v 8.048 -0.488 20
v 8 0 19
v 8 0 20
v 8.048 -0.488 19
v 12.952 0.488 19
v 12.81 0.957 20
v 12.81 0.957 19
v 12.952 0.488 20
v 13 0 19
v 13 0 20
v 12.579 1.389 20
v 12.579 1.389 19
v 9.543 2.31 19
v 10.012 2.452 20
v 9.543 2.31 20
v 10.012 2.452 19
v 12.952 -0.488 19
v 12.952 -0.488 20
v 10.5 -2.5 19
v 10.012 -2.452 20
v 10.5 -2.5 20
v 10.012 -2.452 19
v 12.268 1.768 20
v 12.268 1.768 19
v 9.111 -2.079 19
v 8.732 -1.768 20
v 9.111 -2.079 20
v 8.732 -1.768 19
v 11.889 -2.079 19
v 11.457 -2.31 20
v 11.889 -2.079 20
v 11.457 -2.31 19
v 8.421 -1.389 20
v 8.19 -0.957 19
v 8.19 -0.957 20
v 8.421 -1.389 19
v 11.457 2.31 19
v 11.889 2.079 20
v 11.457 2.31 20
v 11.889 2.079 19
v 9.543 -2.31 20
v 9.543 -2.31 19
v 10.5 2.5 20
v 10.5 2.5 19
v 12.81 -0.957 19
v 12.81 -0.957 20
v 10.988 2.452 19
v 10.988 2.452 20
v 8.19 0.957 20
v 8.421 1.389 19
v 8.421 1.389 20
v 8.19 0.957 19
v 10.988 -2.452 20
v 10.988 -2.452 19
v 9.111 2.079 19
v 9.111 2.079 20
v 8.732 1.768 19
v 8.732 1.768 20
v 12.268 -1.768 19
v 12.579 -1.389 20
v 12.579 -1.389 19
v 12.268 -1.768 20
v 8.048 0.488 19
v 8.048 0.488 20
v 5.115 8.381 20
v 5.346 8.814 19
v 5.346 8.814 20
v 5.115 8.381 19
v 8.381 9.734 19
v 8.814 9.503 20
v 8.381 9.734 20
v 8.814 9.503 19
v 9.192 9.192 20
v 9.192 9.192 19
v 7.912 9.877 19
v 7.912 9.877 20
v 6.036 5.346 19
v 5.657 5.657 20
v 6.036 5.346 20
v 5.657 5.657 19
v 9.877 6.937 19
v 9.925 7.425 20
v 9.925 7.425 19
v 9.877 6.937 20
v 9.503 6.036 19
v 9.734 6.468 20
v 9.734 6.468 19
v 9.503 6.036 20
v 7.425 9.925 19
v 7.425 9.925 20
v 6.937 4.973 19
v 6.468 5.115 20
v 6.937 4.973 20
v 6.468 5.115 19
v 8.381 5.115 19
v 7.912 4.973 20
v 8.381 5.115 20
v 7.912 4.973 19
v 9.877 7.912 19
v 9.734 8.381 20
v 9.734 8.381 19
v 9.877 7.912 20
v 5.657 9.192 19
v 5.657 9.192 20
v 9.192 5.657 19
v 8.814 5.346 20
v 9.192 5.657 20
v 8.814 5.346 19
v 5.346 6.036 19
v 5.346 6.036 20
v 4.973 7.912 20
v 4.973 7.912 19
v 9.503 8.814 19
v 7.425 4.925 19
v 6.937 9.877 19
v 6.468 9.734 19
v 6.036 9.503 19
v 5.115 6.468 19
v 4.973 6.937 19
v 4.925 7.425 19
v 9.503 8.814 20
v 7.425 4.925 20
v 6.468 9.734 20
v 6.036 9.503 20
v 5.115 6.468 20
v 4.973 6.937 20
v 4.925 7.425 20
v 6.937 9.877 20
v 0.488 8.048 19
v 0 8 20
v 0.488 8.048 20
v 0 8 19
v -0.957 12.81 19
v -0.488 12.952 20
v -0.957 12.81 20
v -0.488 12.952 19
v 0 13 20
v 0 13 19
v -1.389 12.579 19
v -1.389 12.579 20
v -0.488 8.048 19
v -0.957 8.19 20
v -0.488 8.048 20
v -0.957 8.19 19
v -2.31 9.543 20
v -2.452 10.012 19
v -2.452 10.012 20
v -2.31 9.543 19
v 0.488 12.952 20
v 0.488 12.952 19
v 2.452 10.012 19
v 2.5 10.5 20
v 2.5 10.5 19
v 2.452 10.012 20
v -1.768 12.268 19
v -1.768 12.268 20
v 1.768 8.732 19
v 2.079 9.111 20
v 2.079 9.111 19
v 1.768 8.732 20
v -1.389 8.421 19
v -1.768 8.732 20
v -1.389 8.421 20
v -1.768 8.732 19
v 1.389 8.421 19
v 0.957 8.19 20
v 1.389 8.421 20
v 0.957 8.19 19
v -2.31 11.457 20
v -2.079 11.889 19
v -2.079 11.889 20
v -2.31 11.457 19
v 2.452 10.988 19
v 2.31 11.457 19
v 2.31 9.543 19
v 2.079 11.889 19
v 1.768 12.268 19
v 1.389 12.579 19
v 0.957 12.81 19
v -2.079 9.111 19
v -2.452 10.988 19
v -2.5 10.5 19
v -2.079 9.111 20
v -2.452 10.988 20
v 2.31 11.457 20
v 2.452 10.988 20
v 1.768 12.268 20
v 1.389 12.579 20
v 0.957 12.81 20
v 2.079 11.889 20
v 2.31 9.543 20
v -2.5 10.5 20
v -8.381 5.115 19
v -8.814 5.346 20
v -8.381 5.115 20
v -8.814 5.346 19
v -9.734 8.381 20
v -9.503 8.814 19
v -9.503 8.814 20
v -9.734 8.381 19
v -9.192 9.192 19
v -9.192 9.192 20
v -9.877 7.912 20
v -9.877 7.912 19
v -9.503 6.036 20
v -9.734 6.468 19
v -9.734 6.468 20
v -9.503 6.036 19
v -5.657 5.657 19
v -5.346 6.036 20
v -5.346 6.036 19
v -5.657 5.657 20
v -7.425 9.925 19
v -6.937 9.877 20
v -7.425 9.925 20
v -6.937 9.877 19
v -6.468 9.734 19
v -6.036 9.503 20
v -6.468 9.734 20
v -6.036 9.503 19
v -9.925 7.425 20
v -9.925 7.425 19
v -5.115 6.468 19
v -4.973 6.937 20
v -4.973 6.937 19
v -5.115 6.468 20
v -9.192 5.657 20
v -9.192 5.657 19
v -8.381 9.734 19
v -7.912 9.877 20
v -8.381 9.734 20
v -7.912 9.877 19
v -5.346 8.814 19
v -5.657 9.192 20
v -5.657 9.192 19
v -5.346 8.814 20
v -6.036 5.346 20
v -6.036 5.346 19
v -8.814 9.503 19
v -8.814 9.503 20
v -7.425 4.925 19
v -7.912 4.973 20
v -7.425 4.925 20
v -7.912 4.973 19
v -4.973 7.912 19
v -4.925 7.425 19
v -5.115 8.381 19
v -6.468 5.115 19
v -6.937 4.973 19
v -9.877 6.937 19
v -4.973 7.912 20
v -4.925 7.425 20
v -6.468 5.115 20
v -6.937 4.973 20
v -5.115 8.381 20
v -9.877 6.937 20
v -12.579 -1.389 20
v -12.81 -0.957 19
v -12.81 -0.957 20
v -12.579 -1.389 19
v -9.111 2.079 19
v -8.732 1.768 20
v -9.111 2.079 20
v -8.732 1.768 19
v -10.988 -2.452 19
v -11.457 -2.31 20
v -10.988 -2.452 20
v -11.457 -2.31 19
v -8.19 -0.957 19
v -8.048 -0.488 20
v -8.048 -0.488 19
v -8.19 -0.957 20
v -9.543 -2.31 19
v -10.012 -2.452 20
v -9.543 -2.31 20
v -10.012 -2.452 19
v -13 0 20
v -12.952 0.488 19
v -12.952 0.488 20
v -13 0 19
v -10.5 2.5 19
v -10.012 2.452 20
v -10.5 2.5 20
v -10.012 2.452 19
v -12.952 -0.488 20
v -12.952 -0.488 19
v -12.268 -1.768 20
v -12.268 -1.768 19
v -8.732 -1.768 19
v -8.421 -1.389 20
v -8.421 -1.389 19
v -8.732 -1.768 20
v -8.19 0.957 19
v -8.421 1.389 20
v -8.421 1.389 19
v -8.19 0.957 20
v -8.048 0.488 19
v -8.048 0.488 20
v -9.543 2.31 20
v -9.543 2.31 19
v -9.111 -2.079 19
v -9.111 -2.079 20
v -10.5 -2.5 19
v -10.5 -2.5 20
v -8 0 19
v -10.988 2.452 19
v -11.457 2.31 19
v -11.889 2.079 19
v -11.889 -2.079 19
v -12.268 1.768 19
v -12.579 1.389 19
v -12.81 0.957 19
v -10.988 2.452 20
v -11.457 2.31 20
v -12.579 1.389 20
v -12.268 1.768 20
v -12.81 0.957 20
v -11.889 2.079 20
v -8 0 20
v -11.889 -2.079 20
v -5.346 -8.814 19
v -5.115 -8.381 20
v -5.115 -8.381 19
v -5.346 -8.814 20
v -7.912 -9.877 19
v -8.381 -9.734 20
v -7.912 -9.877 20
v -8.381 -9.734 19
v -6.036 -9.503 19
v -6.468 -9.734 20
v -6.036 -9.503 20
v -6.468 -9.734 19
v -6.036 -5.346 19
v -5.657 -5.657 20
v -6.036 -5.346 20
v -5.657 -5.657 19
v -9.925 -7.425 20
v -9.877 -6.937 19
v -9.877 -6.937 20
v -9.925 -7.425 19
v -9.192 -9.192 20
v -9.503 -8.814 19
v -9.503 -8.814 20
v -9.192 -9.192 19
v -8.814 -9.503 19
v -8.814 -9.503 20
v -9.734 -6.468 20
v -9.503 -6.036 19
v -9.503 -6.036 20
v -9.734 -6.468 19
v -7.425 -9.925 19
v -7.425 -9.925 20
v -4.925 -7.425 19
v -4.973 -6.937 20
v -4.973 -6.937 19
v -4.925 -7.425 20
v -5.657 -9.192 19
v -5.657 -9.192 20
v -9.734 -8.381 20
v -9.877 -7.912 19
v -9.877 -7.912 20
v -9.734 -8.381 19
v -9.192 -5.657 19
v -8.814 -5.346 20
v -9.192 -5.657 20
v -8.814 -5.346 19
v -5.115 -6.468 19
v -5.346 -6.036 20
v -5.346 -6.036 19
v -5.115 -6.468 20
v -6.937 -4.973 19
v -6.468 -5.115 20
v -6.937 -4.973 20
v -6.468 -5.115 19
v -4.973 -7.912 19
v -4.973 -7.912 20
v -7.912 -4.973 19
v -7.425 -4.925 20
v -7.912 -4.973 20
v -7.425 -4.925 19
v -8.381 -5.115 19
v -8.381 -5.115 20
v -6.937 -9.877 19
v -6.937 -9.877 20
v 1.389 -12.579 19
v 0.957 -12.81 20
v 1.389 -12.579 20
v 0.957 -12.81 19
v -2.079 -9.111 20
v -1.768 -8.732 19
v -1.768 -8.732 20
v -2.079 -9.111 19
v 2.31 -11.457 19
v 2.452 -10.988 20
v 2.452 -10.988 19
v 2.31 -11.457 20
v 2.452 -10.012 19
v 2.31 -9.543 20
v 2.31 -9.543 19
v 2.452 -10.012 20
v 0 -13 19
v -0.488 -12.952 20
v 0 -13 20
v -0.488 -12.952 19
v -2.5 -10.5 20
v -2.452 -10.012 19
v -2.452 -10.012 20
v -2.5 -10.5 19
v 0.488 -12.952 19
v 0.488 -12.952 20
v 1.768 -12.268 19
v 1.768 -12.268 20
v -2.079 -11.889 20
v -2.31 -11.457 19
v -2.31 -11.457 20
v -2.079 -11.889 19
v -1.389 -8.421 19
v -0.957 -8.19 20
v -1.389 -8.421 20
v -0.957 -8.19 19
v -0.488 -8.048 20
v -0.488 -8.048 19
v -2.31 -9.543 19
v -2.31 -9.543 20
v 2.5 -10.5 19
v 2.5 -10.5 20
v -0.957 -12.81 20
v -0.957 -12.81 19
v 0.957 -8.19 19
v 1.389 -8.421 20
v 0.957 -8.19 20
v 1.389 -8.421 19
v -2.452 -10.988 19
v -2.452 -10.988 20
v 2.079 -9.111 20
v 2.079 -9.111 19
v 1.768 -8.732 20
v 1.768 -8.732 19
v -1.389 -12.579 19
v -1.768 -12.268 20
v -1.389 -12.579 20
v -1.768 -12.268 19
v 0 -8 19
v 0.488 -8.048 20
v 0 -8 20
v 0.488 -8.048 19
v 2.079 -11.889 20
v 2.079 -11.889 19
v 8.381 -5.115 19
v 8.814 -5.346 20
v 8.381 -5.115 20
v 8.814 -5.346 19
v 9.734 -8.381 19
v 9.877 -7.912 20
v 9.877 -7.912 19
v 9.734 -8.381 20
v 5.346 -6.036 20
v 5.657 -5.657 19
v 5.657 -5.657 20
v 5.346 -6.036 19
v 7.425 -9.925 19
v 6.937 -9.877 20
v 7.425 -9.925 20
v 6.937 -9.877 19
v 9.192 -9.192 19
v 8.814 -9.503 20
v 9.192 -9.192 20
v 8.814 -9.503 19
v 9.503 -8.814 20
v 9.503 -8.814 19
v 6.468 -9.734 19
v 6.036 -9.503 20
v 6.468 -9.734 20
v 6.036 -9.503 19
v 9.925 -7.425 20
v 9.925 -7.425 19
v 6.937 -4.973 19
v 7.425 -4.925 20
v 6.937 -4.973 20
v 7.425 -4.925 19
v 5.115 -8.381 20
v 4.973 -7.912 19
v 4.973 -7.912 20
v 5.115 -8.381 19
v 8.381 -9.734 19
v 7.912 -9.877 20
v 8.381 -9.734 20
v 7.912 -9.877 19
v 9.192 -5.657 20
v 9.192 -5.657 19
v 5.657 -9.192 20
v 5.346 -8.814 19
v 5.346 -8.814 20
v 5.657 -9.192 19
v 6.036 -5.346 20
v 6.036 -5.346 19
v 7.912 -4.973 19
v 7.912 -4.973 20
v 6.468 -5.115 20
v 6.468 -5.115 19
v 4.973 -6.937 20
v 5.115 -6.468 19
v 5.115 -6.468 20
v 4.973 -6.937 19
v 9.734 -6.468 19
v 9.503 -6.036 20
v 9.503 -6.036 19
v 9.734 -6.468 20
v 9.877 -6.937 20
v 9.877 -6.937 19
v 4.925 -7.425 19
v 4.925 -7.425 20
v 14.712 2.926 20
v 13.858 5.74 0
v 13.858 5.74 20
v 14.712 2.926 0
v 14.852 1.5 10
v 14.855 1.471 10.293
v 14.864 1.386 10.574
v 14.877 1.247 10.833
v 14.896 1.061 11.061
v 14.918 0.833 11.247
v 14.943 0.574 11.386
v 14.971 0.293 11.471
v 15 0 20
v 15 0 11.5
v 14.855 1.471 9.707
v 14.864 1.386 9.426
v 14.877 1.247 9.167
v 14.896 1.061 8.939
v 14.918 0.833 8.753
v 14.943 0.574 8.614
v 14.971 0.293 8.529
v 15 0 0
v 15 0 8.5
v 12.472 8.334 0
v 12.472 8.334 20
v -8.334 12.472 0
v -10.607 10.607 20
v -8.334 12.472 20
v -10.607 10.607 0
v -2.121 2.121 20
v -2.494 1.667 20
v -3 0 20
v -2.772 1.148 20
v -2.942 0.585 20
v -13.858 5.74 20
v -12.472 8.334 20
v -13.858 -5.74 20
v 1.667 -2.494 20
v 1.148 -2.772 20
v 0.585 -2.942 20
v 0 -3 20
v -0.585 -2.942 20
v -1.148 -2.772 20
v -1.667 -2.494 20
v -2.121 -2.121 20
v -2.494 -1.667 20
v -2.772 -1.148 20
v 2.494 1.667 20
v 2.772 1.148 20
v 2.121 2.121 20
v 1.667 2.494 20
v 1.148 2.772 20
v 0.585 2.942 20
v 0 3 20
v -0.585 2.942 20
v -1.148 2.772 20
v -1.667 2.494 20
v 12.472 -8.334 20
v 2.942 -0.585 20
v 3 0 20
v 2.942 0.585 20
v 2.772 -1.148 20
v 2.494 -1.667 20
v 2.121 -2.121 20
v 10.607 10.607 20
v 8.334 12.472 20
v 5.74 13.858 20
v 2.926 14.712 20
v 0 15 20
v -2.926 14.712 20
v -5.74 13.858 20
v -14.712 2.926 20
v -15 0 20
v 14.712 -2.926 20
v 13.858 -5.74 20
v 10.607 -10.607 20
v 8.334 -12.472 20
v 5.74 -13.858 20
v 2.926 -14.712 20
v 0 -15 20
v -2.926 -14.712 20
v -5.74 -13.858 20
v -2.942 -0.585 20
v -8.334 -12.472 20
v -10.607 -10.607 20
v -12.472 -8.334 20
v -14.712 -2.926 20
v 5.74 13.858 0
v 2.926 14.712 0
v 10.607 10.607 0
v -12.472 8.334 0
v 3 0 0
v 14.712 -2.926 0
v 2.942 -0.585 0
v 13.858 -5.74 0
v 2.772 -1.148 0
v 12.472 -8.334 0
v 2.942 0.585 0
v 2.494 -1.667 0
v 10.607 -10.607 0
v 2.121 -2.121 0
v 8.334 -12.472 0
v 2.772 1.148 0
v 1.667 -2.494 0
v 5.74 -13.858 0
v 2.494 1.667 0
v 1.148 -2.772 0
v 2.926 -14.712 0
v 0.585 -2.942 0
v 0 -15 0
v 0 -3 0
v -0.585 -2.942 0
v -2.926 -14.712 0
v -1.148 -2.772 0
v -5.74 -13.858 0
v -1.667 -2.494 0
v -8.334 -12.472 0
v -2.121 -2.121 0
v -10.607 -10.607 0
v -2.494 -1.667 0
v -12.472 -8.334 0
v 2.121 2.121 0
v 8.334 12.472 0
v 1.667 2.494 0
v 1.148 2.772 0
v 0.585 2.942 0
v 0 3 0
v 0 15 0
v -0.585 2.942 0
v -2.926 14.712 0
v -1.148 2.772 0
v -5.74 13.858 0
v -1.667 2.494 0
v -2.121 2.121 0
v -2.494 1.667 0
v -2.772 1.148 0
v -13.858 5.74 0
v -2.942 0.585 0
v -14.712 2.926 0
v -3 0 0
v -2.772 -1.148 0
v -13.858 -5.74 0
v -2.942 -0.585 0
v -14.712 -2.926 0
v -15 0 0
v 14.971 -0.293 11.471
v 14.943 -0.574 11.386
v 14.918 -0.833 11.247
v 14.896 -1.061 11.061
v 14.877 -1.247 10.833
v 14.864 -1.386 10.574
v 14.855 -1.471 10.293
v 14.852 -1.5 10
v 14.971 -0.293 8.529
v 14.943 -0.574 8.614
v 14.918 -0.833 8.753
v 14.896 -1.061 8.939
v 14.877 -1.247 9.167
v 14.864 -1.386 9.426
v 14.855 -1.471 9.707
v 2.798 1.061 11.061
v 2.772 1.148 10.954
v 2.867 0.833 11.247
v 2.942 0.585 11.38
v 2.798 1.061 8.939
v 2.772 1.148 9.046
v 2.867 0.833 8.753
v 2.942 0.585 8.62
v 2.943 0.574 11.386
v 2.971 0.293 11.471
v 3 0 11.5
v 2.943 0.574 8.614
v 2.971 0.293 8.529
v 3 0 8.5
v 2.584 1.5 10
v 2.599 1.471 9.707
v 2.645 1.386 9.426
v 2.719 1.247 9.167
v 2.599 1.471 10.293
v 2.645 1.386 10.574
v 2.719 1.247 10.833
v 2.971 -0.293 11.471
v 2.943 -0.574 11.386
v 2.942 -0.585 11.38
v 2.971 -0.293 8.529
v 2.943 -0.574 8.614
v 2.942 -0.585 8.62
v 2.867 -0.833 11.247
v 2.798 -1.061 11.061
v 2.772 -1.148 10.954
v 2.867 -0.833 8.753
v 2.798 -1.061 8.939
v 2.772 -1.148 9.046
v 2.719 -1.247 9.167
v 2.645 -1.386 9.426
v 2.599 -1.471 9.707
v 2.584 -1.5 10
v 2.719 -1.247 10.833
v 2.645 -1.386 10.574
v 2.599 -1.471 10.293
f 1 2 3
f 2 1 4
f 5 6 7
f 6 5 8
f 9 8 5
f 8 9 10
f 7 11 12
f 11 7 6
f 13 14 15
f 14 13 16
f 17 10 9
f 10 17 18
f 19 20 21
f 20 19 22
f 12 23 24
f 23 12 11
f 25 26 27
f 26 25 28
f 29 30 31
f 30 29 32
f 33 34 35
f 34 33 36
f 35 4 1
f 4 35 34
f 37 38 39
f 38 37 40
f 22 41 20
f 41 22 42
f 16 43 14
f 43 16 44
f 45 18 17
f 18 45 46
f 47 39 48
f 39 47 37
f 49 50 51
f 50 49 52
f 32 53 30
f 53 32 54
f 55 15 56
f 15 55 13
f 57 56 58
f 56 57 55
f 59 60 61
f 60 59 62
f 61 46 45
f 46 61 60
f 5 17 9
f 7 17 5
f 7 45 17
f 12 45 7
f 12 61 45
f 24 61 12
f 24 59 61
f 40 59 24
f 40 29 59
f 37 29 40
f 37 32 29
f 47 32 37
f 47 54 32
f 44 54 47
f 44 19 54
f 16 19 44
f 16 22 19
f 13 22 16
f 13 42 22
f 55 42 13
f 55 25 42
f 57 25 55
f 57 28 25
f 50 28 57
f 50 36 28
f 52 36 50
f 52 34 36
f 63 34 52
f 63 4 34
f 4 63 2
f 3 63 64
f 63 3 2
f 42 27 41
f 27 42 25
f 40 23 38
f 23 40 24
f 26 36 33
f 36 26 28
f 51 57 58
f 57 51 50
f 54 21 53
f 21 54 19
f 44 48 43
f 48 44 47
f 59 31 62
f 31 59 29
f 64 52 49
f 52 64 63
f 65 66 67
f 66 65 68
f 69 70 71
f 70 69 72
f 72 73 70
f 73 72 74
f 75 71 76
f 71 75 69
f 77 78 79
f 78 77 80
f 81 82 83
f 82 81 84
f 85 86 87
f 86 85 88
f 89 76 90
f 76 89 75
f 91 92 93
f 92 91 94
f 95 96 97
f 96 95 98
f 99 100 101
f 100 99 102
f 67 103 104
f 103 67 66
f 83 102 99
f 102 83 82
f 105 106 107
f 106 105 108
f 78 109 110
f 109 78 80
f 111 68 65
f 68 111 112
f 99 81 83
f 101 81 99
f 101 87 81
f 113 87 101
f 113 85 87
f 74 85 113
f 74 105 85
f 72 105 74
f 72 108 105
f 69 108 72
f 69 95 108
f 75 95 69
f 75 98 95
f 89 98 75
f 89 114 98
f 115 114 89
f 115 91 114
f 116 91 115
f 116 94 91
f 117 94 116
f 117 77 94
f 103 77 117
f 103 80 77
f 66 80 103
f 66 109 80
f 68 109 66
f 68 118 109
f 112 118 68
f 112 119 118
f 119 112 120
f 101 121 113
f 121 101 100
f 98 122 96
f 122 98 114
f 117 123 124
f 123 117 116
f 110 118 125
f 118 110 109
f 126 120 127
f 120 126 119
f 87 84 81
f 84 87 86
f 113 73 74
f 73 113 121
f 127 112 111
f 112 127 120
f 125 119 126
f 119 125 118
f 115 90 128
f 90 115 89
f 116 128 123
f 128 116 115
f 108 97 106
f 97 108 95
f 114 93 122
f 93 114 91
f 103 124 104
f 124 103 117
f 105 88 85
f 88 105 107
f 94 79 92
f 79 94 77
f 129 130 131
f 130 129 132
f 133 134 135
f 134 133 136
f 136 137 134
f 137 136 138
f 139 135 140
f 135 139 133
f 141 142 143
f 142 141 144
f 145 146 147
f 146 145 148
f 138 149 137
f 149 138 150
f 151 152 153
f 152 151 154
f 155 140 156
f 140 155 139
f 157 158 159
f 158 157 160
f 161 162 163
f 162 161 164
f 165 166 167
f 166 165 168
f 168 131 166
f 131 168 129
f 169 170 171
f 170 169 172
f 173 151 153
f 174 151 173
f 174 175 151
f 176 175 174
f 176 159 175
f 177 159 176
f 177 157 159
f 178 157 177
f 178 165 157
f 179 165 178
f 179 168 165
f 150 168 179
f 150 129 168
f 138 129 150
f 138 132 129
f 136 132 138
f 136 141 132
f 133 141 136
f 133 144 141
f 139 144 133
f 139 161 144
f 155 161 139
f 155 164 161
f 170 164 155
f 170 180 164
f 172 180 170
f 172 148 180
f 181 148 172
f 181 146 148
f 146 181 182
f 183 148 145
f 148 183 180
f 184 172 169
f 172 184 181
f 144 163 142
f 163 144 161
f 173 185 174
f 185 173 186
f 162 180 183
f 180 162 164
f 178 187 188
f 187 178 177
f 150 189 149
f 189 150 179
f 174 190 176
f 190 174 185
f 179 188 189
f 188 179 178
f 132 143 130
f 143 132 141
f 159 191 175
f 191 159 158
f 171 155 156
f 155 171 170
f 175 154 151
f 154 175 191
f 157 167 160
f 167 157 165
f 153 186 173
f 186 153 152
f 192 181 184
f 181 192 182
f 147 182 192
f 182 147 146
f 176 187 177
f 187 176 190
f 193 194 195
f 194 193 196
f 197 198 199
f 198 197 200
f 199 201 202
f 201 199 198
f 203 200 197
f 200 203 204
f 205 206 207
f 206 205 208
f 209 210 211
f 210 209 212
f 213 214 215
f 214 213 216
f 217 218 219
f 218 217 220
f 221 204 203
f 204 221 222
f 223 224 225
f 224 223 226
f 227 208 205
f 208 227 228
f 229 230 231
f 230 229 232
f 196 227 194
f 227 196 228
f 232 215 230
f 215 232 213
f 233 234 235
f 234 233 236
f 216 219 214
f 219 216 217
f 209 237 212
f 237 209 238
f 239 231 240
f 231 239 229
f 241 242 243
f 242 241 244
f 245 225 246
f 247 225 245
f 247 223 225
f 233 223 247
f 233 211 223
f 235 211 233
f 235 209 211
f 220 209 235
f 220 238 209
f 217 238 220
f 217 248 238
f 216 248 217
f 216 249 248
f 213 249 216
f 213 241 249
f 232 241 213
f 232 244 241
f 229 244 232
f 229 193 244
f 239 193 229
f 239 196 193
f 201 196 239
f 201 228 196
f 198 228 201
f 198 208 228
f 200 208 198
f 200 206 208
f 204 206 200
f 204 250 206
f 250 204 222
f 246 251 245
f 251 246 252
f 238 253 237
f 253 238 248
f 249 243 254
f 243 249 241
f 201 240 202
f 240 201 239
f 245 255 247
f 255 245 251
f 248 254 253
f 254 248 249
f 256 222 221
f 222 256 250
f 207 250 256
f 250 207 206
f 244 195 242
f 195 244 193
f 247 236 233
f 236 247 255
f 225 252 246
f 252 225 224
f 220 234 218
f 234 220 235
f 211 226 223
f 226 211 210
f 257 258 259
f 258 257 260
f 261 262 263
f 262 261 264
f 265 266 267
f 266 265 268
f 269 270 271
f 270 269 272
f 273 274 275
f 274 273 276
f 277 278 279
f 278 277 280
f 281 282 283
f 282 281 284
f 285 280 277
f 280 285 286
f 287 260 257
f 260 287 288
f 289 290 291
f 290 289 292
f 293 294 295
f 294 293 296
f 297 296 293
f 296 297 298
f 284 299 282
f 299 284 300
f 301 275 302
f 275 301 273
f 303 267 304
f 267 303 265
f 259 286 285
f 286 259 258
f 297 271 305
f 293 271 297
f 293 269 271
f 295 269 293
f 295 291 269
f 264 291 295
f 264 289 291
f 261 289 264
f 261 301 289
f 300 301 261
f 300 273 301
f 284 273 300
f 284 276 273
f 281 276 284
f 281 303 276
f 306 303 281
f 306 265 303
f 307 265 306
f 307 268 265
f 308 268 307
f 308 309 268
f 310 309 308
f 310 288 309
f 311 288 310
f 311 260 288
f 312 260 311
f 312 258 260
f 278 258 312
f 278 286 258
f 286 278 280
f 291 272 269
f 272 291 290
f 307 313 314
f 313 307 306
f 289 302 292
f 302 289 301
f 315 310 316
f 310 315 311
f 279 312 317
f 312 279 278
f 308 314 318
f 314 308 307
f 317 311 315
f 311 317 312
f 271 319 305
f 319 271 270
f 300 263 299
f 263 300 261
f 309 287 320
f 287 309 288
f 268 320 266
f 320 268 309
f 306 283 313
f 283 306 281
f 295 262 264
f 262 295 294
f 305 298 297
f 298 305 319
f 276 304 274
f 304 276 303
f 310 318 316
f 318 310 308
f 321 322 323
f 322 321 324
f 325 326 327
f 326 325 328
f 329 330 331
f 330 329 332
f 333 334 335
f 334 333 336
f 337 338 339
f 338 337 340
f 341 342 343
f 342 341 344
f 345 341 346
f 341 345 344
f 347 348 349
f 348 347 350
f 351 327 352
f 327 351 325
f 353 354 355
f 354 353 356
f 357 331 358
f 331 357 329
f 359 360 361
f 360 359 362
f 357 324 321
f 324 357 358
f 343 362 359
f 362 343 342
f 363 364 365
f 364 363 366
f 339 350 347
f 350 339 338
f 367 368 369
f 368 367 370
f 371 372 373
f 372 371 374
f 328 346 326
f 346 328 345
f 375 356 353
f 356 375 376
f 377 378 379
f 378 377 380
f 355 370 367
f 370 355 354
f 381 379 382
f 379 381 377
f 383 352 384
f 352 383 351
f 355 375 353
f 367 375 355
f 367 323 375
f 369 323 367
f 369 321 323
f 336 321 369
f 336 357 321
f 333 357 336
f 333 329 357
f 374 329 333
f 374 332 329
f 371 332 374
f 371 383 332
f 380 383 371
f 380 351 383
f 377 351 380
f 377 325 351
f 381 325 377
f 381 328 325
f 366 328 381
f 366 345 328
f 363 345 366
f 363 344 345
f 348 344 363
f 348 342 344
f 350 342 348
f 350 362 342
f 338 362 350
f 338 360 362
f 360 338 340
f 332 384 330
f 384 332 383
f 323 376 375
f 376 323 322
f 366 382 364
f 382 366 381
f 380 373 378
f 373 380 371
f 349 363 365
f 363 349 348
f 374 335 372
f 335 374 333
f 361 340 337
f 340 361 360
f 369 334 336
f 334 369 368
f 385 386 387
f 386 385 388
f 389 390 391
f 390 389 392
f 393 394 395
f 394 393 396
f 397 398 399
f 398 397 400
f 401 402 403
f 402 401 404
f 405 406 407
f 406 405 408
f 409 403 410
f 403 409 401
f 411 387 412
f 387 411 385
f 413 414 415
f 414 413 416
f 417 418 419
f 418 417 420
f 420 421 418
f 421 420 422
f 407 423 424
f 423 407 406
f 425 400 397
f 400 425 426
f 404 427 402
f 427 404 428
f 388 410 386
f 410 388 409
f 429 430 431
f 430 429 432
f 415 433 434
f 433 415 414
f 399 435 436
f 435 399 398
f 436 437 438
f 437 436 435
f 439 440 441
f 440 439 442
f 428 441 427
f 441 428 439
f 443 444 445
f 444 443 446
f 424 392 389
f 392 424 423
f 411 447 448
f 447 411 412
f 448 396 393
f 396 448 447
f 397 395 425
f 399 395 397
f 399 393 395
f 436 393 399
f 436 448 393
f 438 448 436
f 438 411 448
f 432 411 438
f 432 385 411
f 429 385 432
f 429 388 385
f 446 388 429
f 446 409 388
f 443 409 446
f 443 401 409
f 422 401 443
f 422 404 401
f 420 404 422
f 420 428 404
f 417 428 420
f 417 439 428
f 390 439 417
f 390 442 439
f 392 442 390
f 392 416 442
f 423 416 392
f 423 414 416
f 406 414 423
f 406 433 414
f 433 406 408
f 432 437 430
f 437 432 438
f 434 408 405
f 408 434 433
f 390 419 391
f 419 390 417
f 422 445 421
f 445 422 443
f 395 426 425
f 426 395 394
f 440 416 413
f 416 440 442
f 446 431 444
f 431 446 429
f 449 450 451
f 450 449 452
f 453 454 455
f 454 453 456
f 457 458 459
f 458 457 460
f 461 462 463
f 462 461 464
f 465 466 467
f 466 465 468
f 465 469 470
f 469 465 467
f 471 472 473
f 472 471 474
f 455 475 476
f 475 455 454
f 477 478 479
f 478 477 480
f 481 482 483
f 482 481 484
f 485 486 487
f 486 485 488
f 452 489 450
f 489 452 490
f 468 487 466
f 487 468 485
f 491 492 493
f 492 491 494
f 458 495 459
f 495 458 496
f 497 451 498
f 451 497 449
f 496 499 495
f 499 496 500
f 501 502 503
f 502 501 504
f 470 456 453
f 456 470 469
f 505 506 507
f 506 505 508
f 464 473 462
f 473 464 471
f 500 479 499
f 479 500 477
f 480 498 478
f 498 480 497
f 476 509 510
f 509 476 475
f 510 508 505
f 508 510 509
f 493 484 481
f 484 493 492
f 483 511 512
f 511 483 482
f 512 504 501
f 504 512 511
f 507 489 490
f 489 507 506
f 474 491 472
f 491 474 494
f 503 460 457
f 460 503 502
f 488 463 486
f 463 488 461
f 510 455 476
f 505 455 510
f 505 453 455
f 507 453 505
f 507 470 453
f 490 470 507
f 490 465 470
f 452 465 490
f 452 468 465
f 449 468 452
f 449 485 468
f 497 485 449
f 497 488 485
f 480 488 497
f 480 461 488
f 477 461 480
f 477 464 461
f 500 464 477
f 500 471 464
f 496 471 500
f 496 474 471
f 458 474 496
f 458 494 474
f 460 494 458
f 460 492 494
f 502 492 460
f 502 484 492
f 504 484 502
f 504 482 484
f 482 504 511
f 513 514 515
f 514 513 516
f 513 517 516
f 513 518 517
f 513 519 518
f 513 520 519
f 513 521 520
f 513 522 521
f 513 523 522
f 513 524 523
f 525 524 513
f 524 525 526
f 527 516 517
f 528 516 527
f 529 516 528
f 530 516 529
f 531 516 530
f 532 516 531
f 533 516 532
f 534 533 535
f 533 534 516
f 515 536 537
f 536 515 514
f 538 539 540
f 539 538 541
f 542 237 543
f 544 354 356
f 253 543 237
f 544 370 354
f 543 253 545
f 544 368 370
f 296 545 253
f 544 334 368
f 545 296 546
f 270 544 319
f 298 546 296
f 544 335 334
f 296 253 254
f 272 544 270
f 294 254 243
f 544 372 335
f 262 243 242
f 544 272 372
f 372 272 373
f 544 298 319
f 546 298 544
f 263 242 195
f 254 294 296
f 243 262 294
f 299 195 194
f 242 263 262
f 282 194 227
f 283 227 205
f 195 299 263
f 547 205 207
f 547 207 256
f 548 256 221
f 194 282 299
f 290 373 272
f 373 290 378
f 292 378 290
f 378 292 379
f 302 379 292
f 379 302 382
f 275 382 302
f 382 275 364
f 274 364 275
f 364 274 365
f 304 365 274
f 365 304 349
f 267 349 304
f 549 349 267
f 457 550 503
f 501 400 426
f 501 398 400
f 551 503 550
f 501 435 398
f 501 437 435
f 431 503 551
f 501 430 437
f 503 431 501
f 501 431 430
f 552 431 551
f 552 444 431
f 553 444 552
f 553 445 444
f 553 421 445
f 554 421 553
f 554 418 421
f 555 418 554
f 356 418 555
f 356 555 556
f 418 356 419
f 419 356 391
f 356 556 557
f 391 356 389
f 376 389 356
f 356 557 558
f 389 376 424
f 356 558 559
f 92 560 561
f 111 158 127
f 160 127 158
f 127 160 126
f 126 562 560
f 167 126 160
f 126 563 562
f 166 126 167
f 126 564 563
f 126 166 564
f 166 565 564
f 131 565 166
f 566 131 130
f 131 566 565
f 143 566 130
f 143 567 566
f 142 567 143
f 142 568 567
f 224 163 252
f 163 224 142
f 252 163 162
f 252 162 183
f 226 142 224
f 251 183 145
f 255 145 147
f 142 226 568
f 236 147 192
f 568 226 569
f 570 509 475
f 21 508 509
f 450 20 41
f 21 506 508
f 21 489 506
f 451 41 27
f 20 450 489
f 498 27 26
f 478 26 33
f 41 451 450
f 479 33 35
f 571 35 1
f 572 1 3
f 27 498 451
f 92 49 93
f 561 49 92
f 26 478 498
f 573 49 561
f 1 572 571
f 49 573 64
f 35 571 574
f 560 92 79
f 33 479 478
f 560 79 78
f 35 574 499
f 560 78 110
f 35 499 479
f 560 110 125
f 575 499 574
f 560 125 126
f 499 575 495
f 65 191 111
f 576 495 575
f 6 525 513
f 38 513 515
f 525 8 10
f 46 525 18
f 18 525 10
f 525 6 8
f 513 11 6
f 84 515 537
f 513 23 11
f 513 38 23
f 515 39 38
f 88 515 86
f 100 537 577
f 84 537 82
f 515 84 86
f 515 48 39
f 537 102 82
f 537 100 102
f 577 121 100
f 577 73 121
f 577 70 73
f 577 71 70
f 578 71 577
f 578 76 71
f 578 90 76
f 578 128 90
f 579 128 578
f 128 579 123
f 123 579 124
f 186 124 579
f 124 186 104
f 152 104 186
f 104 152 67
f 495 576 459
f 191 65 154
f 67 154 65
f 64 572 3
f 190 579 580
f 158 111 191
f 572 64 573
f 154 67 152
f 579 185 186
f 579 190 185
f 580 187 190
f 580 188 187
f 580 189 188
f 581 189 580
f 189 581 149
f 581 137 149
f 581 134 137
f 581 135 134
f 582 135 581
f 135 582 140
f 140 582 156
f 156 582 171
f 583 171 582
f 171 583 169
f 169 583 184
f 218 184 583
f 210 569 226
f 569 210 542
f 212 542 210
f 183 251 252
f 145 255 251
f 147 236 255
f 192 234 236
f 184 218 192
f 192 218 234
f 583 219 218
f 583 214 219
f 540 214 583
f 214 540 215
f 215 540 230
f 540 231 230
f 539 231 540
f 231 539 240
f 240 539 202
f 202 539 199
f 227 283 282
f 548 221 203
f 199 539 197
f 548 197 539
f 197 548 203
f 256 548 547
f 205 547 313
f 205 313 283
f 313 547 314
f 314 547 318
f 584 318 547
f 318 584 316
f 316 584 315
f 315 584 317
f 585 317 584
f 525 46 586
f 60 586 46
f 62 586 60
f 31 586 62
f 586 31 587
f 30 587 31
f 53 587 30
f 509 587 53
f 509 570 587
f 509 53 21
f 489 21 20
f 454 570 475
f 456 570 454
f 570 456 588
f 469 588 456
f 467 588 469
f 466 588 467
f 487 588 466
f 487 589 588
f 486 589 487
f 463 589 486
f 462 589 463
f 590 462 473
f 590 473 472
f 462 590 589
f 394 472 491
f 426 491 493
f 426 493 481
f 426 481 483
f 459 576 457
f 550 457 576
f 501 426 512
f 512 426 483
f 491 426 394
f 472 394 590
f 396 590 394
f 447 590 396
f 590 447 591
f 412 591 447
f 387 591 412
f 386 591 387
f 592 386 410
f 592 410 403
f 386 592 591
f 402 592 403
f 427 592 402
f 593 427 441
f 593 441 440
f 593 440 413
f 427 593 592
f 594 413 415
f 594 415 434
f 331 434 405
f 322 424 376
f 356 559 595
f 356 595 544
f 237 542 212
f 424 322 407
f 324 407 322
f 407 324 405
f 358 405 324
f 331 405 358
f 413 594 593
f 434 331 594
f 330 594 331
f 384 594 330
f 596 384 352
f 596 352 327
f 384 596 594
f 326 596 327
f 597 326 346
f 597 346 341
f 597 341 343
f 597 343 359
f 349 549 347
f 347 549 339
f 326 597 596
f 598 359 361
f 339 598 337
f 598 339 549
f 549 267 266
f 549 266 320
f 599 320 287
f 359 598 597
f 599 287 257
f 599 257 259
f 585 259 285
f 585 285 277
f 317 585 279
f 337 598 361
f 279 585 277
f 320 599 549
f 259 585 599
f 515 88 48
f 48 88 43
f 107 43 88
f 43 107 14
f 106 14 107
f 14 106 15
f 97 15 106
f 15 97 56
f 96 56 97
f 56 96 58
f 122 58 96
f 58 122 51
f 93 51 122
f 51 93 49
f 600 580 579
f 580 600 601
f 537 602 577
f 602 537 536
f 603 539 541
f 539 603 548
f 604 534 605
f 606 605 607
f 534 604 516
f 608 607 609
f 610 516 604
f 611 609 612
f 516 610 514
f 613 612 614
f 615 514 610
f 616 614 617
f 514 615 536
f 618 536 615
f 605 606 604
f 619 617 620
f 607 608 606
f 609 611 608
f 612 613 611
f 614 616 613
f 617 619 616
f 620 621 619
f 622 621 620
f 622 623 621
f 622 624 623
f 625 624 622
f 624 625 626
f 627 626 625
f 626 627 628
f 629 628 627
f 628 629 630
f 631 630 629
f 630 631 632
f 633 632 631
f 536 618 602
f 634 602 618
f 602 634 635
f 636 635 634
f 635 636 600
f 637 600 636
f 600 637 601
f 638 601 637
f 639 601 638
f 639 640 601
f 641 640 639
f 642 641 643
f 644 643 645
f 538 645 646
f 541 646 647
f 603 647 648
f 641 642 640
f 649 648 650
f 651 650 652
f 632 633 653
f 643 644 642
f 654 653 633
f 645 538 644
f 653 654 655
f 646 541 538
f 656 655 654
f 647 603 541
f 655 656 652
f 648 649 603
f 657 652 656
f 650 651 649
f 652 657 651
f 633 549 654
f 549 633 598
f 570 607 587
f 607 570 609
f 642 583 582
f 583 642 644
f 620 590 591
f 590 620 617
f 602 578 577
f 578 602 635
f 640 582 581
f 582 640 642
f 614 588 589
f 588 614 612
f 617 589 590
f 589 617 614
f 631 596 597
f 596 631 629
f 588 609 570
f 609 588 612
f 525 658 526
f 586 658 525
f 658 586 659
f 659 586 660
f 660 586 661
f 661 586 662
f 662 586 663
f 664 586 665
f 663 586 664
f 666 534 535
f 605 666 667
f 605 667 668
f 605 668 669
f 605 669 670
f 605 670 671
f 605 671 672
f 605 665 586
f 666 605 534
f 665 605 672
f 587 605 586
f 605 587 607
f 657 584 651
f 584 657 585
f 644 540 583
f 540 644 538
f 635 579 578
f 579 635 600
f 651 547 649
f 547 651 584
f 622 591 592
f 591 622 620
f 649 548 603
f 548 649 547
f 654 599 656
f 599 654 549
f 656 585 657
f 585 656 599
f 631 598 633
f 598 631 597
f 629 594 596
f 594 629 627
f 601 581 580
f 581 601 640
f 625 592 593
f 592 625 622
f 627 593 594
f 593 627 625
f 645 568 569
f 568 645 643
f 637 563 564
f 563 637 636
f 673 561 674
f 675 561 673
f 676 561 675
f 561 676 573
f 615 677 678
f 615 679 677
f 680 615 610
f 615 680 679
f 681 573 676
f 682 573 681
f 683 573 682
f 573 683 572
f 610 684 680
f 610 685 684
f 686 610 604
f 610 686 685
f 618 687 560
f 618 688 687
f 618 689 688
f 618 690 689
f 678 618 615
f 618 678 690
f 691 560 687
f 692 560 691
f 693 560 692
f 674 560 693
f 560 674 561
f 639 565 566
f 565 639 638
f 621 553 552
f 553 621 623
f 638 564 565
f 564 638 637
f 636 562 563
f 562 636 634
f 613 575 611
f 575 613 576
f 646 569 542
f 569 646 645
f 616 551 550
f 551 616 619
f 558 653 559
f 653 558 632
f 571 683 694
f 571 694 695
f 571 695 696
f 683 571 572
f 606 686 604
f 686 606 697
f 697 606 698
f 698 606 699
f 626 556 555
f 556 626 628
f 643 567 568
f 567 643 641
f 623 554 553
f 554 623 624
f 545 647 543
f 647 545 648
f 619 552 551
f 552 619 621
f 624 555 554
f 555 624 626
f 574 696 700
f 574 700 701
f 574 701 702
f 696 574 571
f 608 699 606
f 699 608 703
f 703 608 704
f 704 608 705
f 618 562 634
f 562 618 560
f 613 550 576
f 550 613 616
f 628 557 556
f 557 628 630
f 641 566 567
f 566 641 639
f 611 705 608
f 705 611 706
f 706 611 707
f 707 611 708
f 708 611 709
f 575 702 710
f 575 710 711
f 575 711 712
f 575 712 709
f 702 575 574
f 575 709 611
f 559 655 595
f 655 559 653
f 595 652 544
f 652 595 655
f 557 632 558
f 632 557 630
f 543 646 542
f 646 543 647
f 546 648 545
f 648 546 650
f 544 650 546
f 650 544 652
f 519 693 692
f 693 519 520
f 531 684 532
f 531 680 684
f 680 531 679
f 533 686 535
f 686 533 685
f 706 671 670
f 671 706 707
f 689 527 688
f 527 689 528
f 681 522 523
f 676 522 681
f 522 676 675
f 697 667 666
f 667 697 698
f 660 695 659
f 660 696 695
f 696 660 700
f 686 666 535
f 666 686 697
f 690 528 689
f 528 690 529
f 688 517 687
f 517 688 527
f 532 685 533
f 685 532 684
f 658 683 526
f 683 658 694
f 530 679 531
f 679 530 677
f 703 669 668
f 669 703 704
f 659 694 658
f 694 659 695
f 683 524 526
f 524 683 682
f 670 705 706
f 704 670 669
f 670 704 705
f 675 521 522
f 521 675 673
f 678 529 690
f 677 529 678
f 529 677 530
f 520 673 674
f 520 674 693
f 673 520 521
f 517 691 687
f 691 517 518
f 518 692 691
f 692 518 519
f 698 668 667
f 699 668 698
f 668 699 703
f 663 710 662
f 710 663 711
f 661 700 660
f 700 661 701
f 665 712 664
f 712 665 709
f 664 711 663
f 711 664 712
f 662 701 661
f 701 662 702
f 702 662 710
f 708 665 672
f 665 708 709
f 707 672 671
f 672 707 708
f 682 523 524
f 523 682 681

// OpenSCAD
$fn = 32;

// ----------------------------------------------------------------------
// Control knob: dimpled knob
// ----------------------------------------------------------------------

// --- parameters (mm) ---
dimp_d = 5;               // finger dimple diameter
n_dimp = 8;               // number of dimples
dimp_r = 10.5;            // dimple ring radius
knob_d = 30;              // knob body diameter
knob_h = 20;              // knob body height
bore_d = 6;               // shaft bore diameter
set_d = 3;                // set screw bore diameter

dimp_step = 360 / n_dimp;  // dimple angular step

difference() {
  cylinder(h = knob_h, d = knob_d);
  translate([0, 0, -1]) cylinder(h = knob_h + 2, d = bore_d);
  translate([-1, 0, knob_h / 2]) rotate([0, 90, 0])
    cylinder(h = knob_d / 2 + bore_d / 2 + 2, d = set_d);  for (i = [0 : n_dimp - 1])
    rotate([0, 0, i * dimp_step])
      translate([dimp_r, 0, knob_h - 1])
        cylinder(h = 2, d = dimp_d);
}
